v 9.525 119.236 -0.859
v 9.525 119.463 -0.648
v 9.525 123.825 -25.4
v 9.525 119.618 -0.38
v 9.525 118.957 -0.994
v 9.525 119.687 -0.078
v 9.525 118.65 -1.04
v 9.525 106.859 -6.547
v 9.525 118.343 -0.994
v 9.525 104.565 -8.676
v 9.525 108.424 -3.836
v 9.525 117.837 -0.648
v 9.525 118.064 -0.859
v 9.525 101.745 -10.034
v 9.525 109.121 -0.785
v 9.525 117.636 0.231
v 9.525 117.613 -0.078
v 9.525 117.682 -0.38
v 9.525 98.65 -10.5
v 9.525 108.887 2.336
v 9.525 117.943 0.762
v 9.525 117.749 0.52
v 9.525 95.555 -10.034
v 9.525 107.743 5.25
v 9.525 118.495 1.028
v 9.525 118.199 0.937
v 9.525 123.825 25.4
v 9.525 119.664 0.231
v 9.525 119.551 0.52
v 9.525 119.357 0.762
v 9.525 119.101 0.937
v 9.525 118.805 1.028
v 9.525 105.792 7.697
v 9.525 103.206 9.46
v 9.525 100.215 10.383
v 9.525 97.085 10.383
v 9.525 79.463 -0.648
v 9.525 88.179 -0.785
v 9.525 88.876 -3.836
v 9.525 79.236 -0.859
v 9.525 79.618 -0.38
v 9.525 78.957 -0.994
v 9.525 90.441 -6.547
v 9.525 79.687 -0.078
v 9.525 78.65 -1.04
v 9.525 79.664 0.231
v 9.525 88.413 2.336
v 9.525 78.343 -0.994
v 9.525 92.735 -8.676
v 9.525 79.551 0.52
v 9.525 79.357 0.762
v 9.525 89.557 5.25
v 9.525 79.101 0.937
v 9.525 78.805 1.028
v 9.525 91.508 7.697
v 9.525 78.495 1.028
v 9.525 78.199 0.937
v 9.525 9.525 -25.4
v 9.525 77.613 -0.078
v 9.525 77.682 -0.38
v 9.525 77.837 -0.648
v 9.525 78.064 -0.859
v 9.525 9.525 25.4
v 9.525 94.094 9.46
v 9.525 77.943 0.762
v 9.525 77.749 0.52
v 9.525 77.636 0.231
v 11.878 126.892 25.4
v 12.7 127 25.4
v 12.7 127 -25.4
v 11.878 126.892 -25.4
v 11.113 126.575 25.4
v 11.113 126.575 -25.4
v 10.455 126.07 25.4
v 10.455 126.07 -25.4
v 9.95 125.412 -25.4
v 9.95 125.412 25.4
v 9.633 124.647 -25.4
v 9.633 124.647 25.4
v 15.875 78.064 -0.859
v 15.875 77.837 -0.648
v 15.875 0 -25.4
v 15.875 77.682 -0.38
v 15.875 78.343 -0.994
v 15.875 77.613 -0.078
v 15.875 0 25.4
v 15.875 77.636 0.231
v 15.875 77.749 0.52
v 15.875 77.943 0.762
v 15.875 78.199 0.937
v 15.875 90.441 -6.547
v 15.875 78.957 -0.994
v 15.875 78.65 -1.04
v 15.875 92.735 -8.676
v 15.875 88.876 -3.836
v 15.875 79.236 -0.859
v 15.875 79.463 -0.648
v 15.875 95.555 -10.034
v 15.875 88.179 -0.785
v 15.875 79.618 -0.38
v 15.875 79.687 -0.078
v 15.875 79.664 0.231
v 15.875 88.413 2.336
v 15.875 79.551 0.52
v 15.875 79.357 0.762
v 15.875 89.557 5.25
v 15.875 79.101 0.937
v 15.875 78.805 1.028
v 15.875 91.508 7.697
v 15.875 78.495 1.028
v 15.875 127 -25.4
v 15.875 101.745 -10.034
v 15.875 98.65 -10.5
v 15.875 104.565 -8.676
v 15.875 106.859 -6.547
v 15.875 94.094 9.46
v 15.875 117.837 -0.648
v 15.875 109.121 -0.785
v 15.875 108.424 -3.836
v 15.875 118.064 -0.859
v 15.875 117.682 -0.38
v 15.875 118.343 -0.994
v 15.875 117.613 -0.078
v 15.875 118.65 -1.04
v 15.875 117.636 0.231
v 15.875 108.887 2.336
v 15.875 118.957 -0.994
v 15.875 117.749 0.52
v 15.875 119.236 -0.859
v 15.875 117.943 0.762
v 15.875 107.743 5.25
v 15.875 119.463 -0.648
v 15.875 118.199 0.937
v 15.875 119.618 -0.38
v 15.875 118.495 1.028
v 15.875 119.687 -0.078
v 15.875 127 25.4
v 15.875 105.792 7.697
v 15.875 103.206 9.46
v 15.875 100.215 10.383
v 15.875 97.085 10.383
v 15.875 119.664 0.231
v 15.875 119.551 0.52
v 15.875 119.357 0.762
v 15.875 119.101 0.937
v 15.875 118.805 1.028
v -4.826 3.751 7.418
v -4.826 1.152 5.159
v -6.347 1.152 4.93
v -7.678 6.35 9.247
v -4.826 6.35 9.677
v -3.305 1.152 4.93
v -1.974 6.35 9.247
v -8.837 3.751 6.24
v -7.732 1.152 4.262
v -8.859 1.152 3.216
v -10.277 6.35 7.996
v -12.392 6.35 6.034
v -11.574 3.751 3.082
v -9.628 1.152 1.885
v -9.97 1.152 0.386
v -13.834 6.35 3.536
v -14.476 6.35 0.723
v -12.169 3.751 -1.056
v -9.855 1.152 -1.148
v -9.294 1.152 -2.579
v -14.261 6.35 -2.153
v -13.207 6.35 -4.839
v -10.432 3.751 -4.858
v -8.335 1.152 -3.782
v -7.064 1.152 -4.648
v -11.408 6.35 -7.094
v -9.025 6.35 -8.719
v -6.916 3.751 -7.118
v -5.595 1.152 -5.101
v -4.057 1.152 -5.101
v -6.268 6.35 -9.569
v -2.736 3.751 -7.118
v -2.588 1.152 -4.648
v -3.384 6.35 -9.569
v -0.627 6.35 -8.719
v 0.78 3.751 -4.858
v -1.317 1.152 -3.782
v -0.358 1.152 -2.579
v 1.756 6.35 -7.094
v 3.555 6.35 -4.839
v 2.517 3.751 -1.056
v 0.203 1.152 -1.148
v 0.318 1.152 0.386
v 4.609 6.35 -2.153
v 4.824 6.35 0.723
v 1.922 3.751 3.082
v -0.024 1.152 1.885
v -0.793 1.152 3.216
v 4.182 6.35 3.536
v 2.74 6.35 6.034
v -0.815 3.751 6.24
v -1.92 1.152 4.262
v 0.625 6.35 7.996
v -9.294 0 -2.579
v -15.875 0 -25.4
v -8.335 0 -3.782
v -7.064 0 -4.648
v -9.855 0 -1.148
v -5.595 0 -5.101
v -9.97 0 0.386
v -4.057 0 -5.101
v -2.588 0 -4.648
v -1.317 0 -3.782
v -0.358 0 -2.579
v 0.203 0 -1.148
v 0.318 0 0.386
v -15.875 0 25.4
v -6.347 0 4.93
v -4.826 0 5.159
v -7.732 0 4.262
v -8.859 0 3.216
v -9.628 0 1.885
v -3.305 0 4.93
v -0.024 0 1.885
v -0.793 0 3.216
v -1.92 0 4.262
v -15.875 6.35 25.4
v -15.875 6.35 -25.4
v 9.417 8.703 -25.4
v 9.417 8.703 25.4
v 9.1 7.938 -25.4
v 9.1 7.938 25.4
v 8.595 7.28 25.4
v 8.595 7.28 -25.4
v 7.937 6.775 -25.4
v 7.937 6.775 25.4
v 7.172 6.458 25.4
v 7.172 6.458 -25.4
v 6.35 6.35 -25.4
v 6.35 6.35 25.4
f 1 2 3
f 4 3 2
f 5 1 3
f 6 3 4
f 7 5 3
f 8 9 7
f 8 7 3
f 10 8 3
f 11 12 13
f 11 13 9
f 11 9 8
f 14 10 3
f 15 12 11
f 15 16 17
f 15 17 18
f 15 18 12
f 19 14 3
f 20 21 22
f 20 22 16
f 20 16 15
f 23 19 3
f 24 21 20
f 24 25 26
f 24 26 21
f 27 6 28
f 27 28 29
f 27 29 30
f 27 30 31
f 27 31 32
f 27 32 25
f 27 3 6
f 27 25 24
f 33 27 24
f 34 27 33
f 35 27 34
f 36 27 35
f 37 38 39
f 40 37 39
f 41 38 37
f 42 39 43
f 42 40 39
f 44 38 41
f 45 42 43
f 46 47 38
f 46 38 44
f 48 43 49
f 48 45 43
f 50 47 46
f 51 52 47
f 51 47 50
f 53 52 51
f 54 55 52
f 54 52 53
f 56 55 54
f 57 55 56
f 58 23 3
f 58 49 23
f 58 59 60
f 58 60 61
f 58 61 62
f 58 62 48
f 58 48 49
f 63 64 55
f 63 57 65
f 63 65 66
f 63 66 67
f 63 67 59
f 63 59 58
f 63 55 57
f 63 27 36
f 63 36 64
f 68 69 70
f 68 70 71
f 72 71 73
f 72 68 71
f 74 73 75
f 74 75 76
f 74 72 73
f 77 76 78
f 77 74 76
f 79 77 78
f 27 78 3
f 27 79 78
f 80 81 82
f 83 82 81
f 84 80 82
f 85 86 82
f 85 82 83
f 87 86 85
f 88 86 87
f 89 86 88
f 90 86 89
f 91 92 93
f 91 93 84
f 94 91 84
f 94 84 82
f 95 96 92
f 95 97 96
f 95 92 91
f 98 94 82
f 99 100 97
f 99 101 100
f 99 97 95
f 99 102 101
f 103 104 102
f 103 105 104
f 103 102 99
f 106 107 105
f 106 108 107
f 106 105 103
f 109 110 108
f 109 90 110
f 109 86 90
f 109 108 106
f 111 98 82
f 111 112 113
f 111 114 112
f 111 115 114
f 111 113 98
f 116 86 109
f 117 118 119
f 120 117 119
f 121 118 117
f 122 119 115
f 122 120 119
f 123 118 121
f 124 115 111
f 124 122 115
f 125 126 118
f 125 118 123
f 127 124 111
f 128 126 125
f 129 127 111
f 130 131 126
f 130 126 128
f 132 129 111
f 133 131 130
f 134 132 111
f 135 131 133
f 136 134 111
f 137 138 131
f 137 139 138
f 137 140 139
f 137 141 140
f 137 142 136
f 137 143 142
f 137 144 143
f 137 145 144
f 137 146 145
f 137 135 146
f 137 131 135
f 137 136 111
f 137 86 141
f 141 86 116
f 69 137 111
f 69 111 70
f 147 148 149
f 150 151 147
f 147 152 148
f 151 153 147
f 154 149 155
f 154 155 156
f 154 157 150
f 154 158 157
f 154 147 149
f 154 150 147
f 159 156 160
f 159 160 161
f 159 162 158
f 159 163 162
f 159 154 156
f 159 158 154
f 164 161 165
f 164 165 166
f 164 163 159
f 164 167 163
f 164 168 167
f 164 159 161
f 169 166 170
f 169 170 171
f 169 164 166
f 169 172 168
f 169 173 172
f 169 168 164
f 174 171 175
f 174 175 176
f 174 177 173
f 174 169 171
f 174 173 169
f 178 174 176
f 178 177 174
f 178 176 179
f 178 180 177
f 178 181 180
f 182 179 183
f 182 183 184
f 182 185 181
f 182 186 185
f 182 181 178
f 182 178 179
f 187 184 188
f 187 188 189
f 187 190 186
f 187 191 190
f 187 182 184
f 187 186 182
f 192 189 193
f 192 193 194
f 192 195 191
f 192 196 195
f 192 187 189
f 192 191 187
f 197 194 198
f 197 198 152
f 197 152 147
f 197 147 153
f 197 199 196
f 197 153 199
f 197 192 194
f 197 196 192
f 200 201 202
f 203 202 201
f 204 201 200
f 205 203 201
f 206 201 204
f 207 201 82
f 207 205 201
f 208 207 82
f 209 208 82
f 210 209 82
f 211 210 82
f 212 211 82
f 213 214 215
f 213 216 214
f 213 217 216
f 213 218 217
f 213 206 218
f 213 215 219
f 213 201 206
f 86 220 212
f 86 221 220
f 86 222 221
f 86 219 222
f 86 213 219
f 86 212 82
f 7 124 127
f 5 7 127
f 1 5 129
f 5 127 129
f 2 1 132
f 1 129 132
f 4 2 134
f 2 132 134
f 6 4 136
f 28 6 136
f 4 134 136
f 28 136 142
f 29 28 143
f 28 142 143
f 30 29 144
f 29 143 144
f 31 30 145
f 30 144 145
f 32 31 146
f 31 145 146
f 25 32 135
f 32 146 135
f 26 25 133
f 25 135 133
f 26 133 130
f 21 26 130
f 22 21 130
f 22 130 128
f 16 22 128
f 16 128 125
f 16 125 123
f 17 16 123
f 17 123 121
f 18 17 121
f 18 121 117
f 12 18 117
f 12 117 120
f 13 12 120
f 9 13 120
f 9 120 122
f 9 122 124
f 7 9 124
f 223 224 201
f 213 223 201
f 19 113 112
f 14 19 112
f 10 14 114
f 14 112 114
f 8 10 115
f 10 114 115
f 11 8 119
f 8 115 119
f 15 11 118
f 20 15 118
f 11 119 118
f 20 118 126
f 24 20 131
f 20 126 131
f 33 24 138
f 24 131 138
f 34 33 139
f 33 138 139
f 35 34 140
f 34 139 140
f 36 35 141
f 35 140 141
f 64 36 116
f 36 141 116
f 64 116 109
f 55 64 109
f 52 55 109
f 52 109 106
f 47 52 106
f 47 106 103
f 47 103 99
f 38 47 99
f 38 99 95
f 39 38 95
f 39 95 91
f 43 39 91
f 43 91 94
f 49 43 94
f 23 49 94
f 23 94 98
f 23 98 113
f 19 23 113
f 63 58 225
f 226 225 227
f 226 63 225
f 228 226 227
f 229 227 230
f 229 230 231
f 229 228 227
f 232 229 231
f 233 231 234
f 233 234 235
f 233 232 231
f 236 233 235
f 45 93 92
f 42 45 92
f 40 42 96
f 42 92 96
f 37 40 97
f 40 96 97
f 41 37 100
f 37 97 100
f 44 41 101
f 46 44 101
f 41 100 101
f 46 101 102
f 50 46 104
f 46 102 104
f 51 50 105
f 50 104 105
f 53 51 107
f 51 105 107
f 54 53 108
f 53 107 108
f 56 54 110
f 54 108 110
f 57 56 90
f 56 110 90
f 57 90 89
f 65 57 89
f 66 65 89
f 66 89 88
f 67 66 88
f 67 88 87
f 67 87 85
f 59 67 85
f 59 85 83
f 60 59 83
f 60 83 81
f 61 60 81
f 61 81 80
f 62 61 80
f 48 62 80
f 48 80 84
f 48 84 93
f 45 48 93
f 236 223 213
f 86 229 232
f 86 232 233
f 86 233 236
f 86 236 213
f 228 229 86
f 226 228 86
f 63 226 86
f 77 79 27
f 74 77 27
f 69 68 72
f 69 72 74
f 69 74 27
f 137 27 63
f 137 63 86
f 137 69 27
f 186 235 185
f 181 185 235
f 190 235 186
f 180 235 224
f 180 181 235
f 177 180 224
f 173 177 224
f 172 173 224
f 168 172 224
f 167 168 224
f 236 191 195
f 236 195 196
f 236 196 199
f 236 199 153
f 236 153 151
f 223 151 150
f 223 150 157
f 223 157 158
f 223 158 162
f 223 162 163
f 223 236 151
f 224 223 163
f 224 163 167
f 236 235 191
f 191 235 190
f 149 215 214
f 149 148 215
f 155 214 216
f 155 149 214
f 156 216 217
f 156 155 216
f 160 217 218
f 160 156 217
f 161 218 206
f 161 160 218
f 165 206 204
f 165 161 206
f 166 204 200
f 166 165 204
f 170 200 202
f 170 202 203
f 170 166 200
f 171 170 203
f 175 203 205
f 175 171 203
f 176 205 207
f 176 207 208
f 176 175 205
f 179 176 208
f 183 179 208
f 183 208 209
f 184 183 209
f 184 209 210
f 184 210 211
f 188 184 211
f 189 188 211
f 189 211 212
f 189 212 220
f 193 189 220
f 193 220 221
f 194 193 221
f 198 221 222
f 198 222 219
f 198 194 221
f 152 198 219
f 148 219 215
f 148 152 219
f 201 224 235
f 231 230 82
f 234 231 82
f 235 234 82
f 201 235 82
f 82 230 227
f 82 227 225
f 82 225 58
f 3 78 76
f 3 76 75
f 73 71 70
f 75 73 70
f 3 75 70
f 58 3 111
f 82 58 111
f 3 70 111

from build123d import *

# Parameters (mm, degrees)
BOSS_EXTRUDE1_DEPTH = 25.4
SKETCH3_R           = 4.765
CUT_EXTRUDE1_DEPTH  = 128
SKETCH4_R           = 10.5
CUT_EXTRUDE2_DEPTH  = 12.7
SKETCH5_R           = 1.04
CUT_EXTRUDE3_DEPTH  = 10


with BuildPart() as part:
    # Sketch2 → Boss-Extrude1 (new body, symmetric)
    with BuildSketch(Plane.XY):
        with BuildLine():
            Line((-15.875, 0), (15.875, 0))
            Line((15.875, 0), (15.875, 127))
            Line((15.875, 127), (12.7, 127))
            ThreePointArc((12.7, 127), (10.45493597, 126.07006403), (9.525, 123.825))
            Line((9.525, 123.825), (9.525, 9.525))
            ThreePointArc((9.525, 9.525), (8.59506403, 7.27993597), (6.35, 6.35))
            Line((6.35, 6.35), (-15.875, 6.35))
            Line((-15.875, 6.35), (-15.875, 0))
        make_face()
    extrude(amount=BOSS_EXTRUDE1_DEPTH, both=True)

    # Sketch3 → Cut-Extrude1 (cut, through all)
    with BuildSketch(Plane.XZ):
        with Locations((-4.826, 0)):
            Circle(SKETCH3_R)
    extrude(amount=-CUT_EXTRUDE1_DEPTH, mode=Mode.SUBTRACT)

    # Sketch4 → Cut-Extrude2 (cut)
    with BuildSketch(Plane(origin=(15.875, 0, 0), x_dir=(0, 0, -1), z_dir=(1, 0, 0))):
        with Locations((0, 98.65)):
            Circle(SKETCH4_R)
    extrude(amount=-CUT_EXTRUDE2_DEPTH, mode=Mode.SUBTRACT)

    # Sketch5 → Cut-Extrude3 (cut)
    with BuildSketch(Plane(origin=(15.875, 0, 0), x_dir=(0, 0, -1), z_dir=(1, 0, 0))):
        with Locations((0, 78.65)):
            Circle(SKETCH5_R)
        with Locations((0, 118.65)):
            Circle(SKETCH5_R)
    extrude(amount=-CUT_EXTRUDE3_DEPTH, mode=Mode.SUBTRACT)

    # Sketch7 → CSK for 3/8 Flat Head Machine Screw1 (revolve, cut)
    with BuildSketch(Plane(origin=(-4.826, 6.35, 0), x_dir=(0, 0, 1), z_dir=(1, 0, 0))):
        Polygon((0, 0), (0, 6.35), (5.15874, 6.35), (5.15874, 5.198123707), (9.6774, 0), align=None)
    revolve(axis=Axis((-4.826, 12.7, 0), (0, -1, 0)), mode=Mode.SUBTRACT)


solid = part.part
